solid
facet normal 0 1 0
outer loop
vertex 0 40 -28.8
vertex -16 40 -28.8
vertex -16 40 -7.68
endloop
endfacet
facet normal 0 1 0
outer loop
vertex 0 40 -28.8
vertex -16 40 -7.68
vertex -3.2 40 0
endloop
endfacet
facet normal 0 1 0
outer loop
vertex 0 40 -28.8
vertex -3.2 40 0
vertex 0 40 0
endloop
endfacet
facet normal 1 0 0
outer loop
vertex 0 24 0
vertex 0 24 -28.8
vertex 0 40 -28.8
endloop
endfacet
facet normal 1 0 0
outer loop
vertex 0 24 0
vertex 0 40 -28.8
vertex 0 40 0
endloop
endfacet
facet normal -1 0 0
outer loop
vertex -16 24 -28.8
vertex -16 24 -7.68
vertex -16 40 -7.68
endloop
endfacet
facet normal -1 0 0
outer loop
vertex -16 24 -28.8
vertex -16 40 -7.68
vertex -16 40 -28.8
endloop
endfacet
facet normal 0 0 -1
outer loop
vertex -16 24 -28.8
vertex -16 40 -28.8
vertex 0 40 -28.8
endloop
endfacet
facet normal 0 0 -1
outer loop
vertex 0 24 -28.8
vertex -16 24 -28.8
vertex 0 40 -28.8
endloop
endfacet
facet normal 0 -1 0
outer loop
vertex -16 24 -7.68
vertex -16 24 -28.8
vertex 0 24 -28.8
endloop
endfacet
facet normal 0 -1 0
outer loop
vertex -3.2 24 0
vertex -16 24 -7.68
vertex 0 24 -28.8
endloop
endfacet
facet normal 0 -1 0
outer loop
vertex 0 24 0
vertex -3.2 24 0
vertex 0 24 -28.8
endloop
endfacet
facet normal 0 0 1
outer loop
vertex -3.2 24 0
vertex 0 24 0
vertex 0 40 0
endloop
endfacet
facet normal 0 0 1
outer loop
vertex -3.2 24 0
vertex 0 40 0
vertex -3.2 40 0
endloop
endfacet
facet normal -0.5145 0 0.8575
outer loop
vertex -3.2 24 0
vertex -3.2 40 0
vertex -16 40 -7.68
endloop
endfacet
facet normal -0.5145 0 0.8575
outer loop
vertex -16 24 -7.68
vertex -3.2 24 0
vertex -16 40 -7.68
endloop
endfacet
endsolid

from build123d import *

# Parameters (mm, degrees)
SKETCH023_W     = 16
SKETCH023_H     = 16
PAD013_DEPTH    = 28.8
POCKET010_DEPTH = 16
POCKET047_DEPTH = 16
PAD140_DEPTH    = 16


with BuildPart() as part:
    # Sketch023 (on Face56 of Binder009) → Pad013 (new body)
    with BuildSketch(Plane.XY.offset(-28.8)):
        with Locations((-8, 32)):
            Rectangle(SKETCH023_W, SKETCH023_H)
    extrude(amount=PAD013_DEPTH)

    # Sketch024 (on Face3 of Pad013) → Pocket010 (cut)
    with BuildSketch(Plane.XZ.offset(-24)):
        Polygon((-16, -9.6), (0, 0), (-16, 0), align=None)
    extrude(amount=-POCKET010_DEPTH, mode=Mode.SUBTRACT)

    # Sketch138 (on Face6 of Pocket010) → Pocket047 (cut)
    with BuildSketch(Plane.XZ.offset(-24)):
        Polygon((0, 0), (-3.2, 0), (-16, -7.68), (-16, -10.88), (-3.2, -3.2), (0, -3.2), align=None)
    extrude(amount=-POCKET047_DEPTH, mode=Mode.SUBTRACT)

    # Sketch138 (on Face6 of Pocket010) → Pad140 (join)
    with BuildSketch(Plane.XZ.offset(-24)):
        Polygon((0, 0), (-3.2, 0), (-16, -7.68), (-16, -10.88), (-3.2, -3.2), (0, -3.2), align=None)
    extrude(amount=-PAD140_DEPTH)


solid = part.part
